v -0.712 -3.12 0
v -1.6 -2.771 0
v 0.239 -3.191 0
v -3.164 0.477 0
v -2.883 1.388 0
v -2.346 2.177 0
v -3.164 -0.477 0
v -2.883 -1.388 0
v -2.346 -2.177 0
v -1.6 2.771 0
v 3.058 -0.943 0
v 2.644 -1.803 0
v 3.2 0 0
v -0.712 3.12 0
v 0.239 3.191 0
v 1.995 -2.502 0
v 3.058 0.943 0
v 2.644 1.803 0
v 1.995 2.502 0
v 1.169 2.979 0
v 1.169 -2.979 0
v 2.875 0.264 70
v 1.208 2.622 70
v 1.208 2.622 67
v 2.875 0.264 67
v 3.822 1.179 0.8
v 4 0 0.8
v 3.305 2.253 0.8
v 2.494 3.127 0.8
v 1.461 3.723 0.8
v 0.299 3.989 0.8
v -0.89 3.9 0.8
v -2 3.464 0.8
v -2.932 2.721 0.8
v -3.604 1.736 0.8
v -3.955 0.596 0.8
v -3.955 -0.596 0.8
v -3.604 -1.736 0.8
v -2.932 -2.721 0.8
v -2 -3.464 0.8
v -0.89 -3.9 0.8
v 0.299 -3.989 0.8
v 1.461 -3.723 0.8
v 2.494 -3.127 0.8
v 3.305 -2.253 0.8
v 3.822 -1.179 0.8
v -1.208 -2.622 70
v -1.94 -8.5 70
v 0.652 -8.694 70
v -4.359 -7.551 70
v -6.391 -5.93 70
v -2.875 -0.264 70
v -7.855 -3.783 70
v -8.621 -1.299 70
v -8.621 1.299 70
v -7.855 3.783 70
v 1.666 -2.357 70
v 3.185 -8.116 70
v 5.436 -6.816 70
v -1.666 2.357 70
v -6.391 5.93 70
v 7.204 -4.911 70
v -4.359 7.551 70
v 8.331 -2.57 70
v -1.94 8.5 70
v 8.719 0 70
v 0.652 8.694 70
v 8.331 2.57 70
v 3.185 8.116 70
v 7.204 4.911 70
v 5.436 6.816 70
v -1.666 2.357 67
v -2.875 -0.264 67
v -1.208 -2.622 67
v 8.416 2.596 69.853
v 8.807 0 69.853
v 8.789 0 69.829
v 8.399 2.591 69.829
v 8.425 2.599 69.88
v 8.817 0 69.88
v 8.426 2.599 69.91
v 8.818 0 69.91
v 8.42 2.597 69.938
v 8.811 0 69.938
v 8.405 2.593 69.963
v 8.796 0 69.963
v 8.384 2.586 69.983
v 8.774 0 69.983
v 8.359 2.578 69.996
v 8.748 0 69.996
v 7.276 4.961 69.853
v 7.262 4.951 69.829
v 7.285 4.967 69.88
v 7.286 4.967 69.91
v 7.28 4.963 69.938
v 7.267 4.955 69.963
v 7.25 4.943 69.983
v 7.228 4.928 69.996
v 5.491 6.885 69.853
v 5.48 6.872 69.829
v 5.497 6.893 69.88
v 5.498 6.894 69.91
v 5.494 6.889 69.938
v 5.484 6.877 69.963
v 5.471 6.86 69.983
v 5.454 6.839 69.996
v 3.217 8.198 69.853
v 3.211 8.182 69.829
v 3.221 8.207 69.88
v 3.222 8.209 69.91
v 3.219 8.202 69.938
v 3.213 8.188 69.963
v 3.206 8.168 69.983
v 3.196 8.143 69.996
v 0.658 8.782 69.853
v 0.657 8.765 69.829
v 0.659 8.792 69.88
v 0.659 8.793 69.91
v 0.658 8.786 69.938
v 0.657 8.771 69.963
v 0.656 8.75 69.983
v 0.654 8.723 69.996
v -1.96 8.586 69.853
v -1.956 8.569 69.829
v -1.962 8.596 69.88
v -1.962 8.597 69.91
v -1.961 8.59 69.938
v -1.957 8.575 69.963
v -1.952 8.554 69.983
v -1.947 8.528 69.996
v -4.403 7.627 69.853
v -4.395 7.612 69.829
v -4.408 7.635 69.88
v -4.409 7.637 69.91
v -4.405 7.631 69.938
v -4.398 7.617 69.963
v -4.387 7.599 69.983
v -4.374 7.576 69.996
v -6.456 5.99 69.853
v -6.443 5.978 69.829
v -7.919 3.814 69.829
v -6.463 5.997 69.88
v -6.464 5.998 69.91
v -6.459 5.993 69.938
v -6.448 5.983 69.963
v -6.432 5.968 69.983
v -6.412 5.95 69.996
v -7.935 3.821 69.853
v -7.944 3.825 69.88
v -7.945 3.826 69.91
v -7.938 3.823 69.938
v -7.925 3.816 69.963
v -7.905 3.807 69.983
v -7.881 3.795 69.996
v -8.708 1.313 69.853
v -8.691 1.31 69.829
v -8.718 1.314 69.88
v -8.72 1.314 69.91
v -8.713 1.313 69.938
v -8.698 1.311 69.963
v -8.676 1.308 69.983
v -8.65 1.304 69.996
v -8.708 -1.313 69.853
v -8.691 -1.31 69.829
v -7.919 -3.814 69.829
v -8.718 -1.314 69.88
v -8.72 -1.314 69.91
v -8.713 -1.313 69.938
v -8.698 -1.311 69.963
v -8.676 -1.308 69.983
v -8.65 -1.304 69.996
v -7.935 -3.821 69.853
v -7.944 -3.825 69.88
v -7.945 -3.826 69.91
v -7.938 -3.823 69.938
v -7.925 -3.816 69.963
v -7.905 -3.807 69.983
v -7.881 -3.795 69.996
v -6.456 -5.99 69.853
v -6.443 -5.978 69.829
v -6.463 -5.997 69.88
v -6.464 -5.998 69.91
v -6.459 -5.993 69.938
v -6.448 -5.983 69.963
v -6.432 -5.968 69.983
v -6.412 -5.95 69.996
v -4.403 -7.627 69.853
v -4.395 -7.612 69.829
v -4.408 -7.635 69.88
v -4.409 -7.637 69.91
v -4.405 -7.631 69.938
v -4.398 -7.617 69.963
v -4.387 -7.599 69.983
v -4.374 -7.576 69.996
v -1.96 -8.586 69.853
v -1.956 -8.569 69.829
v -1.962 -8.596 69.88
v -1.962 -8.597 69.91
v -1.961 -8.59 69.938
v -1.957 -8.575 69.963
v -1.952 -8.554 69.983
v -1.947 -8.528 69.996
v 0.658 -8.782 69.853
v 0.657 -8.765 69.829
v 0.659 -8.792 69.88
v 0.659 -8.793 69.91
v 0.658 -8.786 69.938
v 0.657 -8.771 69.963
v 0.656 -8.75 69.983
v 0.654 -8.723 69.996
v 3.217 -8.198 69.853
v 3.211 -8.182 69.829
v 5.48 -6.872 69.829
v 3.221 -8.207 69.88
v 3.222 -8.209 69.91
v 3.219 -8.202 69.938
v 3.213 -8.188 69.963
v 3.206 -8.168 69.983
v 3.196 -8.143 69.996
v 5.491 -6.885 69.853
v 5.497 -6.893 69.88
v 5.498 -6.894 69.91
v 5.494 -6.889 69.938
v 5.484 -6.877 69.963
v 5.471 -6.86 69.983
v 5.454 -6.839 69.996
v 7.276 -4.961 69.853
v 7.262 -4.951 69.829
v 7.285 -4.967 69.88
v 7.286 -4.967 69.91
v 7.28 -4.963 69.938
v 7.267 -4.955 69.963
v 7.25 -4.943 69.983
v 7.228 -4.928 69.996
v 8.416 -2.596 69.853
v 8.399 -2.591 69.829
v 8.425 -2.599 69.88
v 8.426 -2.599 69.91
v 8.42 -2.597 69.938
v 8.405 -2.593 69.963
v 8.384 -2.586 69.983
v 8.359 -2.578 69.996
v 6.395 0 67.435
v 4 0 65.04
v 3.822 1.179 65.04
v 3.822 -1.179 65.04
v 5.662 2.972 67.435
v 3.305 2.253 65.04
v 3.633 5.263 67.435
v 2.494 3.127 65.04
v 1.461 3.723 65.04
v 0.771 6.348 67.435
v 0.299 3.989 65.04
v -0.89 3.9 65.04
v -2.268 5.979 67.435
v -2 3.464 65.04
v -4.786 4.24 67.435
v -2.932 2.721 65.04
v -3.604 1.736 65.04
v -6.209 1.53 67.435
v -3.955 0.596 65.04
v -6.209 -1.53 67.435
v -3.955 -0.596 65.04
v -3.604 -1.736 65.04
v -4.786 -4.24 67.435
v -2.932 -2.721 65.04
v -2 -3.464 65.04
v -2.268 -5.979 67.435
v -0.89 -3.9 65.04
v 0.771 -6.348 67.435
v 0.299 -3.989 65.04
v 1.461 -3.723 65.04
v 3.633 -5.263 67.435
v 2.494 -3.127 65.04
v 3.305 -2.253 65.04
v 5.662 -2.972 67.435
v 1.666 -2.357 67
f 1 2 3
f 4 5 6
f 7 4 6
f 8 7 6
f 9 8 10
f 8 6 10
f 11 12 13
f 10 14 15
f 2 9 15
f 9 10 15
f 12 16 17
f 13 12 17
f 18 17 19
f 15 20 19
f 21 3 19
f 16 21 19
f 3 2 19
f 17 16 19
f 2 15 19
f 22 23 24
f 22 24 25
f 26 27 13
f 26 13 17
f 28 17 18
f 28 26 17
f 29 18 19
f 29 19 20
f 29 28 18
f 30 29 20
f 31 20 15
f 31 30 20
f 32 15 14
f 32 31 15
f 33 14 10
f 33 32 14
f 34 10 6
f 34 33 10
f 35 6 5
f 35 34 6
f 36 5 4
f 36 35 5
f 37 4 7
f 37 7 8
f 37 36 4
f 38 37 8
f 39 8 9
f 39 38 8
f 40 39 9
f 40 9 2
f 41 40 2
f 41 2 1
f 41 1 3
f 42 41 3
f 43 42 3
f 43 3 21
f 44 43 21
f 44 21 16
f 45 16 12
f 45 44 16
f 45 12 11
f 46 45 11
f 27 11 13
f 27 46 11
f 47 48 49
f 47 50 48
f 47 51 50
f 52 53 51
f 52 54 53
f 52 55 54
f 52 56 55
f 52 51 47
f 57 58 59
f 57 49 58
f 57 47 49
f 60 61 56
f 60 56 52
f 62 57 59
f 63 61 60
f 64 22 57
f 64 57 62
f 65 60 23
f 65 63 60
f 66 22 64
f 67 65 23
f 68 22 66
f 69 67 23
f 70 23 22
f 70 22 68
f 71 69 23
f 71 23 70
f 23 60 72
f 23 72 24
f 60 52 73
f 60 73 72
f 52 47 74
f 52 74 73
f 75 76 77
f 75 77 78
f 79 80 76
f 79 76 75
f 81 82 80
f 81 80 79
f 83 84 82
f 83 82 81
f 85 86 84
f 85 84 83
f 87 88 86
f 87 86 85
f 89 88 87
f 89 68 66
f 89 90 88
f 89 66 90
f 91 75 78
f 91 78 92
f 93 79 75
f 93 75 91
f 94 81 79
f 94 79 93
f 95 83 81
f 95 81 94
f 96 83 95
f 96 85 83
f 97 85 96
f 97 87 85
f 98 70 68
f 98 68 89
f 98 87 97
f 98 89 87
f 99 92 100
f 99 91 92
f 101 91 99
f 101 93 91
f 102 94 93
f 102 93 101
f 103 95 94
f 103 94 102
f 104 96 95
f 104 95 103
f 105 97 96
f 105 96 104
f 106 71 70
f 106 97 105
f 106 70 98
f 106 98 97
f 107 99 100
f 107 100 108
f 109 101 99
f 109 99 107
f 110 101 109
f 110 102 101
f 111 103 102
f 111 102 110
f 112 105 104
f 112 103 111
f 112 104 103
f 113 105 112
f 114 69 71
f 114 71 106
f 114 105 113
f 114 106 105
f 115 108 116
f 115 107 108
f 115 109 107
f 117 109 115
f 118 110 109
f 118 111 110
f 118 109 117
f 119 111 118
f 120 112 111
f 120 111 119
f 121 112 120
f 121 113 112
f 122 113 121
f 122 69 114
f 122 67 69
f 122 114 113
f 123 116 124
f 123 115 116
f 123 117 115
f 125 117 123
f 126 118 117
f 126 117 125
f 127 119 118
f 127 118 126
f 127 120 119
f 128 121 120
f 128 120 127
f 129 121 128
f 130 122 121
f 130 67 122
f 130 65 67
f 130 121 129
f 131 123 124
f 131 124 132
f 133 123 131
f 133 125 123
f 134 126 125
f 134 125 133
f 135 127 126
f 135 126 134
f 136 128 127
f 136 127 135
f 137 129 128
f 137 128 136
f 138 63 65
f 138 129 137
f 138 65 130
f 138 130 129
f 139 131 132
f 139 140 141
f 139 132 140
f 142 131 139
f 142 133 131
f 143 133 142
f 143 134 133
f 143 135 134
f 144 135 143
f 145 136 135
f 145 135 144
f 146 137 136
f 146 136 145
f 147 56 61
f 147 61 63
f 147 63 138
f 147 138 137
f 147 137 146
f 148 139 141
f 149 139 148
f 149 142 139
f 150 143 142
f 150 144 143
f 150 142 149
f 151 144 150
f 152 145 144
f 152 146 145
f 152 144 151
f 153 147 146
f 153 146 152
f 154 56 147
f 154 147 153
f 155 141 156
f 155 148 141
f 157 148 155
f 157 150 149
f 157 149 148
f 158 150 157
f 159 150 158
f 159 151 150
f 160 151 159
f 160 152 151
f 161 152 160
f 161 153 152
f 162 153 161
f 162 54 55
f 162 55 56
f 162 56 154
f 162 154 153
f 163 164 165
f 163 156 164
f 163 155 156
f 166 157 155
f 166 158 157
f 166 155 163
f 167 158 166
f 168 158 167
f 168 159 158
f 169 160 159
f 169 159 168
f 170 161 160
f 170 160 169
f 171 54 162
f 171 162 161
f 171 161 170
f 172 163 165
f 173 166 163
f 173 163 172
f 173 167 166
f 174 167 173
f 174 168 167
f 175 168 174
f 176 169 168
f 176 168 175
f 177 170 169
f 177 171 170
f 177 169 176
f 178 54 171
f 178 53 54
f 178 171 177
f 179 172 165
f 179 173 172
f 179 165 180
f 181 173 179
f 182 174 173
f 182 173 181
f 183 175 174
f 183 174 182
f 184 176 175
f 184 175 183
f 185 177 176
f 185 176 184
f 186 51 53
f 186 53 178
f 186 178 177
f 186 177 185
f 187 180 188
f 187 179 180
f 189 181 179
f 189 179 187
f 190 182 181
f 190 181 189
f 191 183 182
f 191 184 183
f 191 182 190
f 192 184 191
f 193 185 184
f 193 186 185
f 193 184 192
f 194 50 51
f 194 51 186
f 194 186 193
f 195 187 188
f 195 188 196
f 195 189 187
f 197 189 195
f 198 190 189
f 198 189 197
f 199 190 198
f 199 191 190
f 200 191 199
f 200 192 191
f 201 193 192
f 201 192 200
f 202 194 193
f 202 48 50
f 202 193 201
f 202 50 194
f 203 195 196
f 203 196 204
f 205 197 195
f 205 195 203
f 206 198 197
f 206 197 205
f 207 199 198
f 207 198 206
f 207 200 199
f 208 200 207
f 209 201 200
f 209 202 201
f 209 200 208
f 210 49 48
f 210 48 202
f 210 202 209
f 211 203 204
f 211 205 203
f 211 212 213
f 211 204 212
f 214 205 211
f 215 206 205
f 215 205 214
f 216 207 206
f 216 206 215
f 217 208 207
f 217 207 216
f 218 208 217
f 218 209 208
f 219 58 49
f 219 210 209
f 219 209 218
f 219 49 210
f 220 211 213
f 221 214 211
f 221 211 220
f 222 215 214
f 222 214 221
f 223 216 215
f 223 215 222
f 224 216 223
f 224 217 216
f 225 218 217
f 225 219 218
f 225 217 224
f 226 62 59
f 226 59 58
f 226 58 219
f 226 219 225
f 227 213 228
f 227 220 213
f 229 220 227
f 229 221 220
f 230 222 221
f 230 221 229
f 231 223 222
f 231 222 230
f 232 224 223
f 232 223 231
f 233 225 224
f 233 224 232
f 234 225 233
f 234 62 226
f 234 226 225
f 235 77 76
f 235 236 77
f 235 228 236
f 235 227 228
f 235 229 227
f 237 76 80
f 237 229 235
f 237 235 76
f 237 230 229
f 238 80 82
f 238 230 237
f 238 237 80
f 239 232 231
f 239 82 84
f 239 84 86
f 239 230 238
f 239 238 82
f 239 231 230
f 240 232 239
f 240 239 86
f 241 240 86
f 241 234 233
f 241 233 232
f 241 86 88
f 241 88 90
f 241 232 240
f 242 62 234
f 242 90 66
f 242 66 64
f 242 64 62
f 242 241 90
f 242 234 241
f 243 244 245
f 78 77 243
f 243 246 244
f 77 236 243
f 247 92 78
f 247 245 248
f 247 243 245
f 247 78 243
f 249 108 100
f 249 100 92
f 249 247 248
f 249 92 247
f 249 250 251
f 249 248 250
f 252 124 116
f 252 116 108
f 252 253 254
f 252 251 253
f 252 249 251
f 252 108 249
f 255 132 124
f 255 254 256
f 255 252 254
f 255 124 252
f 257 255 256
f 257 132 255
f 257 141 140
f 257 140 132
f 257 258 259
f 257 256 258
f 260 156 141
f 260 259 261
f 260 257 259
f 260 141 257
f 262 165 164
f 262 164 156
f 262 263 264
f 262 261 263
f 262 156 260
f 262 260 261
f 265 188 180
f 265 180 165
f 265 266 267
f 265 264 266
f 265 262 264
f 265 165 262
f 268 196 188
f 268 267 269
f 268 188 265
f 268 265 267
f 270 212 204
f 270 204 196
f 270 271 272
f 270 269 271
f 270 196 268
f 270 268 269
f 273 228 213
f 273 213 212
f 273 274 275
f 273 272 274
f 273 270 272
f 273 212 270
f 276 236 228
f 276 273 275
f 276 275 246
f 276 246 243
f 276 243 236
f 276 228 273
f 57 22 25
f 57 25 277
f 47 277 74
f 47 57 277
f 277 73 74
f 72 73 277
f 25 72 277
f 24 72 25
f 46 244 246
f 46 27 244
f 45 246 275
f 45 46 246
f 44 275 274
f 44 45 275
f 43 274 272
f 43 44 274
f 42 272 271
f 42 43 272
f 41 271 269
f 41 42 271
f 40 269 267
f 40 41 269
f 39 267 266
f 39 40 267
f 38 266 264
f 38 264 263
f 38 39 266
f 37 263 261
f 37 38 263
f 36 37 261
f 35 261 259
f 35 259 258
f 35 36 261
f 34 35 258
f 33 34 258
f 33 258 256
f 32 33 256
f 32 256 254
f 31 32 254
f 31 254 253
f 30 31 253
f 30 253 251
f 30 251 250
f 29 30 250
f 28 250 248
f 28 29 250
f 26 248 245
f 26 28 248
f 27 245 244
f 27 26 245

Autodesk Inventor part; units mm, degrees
ref_plane "YZ Plane" through (0, 0, 0) normal (1, 0, 0) x (0, 1, 0)
ref_plane "XZ Plane" through (0, 0, 0) normal (0, 1, 0) x (-1, 0, 0)
ref_plane "XY Plane" through (0, 0, 0) normal (0, 0, 1) x (1, 0, 0)
sketch "Sketch1" plane through (0, 0, 0) normal (0, 0, 1) x (1, 0, 0)
  circle A0 centre (0, 0) radius 4
  dimension "Diameter" = 8
extrude "Extrusion1" add sketch "Sketch1" along normal blind 65.04
sketch "Sketch2" plane through (0, 0, 65.04) normal (0, 0, 1) x (1, 0, 0)
  circle A0 centre (0, 0) radius 4 projected
extrude "Extrusion2" add sketch "Sketch2" along normal blind 4.96 draft 45
sketch "Sketch3" plane through (0, 0, 70) normal (0, 0, 1) x (1, 0, 0)
  circle A0 centre (0, 0) radius 8.96 projected
  circle A1 centre (0, 0) radius 2.8868 construction
  line L0 (1.2084, 2.6217) -> (2.8746, 0.2644)
  line L1 (2.8746, 0.2644) -> (1.6662, -2.3573)
  line L2 (1.6662, -2.3573) -> (-1.2084, -2.6217)
  line L3 (-1.2084, -2.6217) -> (-2.8746, -0.2644)
  line L4 (-2.8746, -0.2644) -> (-1.6662, 2.3573)
  line L5 (-1.6662, 2.3573) -> (1.2084, 2.6217)
  dimension "Hex_Width" = 5
extrude "Extrusion3" cut sketch "Sketch3" against normal blind 3 contours L0 L1 L2 L3 L4 L5
thread "Thread1" size "M8x1.25" class "4g6g" standard "ANSI Metric M Profile" length 45
chamfer "Chamfer2" distance 0.8 angle 45 1 edges at (-4, 0, 0)
fillet "Fillet1" radius 0.1 1 edges at (-8.96, 0, 70)
equation "\"d10\" = Thread_Length"
equation "\"d13\" = Chamfer"
equation "\"Thread_Length\" = 45"
equation "\"Chamfer\" = 0.8"
properties part number "SCREW,FLAT HD,P,5,M8X1"
